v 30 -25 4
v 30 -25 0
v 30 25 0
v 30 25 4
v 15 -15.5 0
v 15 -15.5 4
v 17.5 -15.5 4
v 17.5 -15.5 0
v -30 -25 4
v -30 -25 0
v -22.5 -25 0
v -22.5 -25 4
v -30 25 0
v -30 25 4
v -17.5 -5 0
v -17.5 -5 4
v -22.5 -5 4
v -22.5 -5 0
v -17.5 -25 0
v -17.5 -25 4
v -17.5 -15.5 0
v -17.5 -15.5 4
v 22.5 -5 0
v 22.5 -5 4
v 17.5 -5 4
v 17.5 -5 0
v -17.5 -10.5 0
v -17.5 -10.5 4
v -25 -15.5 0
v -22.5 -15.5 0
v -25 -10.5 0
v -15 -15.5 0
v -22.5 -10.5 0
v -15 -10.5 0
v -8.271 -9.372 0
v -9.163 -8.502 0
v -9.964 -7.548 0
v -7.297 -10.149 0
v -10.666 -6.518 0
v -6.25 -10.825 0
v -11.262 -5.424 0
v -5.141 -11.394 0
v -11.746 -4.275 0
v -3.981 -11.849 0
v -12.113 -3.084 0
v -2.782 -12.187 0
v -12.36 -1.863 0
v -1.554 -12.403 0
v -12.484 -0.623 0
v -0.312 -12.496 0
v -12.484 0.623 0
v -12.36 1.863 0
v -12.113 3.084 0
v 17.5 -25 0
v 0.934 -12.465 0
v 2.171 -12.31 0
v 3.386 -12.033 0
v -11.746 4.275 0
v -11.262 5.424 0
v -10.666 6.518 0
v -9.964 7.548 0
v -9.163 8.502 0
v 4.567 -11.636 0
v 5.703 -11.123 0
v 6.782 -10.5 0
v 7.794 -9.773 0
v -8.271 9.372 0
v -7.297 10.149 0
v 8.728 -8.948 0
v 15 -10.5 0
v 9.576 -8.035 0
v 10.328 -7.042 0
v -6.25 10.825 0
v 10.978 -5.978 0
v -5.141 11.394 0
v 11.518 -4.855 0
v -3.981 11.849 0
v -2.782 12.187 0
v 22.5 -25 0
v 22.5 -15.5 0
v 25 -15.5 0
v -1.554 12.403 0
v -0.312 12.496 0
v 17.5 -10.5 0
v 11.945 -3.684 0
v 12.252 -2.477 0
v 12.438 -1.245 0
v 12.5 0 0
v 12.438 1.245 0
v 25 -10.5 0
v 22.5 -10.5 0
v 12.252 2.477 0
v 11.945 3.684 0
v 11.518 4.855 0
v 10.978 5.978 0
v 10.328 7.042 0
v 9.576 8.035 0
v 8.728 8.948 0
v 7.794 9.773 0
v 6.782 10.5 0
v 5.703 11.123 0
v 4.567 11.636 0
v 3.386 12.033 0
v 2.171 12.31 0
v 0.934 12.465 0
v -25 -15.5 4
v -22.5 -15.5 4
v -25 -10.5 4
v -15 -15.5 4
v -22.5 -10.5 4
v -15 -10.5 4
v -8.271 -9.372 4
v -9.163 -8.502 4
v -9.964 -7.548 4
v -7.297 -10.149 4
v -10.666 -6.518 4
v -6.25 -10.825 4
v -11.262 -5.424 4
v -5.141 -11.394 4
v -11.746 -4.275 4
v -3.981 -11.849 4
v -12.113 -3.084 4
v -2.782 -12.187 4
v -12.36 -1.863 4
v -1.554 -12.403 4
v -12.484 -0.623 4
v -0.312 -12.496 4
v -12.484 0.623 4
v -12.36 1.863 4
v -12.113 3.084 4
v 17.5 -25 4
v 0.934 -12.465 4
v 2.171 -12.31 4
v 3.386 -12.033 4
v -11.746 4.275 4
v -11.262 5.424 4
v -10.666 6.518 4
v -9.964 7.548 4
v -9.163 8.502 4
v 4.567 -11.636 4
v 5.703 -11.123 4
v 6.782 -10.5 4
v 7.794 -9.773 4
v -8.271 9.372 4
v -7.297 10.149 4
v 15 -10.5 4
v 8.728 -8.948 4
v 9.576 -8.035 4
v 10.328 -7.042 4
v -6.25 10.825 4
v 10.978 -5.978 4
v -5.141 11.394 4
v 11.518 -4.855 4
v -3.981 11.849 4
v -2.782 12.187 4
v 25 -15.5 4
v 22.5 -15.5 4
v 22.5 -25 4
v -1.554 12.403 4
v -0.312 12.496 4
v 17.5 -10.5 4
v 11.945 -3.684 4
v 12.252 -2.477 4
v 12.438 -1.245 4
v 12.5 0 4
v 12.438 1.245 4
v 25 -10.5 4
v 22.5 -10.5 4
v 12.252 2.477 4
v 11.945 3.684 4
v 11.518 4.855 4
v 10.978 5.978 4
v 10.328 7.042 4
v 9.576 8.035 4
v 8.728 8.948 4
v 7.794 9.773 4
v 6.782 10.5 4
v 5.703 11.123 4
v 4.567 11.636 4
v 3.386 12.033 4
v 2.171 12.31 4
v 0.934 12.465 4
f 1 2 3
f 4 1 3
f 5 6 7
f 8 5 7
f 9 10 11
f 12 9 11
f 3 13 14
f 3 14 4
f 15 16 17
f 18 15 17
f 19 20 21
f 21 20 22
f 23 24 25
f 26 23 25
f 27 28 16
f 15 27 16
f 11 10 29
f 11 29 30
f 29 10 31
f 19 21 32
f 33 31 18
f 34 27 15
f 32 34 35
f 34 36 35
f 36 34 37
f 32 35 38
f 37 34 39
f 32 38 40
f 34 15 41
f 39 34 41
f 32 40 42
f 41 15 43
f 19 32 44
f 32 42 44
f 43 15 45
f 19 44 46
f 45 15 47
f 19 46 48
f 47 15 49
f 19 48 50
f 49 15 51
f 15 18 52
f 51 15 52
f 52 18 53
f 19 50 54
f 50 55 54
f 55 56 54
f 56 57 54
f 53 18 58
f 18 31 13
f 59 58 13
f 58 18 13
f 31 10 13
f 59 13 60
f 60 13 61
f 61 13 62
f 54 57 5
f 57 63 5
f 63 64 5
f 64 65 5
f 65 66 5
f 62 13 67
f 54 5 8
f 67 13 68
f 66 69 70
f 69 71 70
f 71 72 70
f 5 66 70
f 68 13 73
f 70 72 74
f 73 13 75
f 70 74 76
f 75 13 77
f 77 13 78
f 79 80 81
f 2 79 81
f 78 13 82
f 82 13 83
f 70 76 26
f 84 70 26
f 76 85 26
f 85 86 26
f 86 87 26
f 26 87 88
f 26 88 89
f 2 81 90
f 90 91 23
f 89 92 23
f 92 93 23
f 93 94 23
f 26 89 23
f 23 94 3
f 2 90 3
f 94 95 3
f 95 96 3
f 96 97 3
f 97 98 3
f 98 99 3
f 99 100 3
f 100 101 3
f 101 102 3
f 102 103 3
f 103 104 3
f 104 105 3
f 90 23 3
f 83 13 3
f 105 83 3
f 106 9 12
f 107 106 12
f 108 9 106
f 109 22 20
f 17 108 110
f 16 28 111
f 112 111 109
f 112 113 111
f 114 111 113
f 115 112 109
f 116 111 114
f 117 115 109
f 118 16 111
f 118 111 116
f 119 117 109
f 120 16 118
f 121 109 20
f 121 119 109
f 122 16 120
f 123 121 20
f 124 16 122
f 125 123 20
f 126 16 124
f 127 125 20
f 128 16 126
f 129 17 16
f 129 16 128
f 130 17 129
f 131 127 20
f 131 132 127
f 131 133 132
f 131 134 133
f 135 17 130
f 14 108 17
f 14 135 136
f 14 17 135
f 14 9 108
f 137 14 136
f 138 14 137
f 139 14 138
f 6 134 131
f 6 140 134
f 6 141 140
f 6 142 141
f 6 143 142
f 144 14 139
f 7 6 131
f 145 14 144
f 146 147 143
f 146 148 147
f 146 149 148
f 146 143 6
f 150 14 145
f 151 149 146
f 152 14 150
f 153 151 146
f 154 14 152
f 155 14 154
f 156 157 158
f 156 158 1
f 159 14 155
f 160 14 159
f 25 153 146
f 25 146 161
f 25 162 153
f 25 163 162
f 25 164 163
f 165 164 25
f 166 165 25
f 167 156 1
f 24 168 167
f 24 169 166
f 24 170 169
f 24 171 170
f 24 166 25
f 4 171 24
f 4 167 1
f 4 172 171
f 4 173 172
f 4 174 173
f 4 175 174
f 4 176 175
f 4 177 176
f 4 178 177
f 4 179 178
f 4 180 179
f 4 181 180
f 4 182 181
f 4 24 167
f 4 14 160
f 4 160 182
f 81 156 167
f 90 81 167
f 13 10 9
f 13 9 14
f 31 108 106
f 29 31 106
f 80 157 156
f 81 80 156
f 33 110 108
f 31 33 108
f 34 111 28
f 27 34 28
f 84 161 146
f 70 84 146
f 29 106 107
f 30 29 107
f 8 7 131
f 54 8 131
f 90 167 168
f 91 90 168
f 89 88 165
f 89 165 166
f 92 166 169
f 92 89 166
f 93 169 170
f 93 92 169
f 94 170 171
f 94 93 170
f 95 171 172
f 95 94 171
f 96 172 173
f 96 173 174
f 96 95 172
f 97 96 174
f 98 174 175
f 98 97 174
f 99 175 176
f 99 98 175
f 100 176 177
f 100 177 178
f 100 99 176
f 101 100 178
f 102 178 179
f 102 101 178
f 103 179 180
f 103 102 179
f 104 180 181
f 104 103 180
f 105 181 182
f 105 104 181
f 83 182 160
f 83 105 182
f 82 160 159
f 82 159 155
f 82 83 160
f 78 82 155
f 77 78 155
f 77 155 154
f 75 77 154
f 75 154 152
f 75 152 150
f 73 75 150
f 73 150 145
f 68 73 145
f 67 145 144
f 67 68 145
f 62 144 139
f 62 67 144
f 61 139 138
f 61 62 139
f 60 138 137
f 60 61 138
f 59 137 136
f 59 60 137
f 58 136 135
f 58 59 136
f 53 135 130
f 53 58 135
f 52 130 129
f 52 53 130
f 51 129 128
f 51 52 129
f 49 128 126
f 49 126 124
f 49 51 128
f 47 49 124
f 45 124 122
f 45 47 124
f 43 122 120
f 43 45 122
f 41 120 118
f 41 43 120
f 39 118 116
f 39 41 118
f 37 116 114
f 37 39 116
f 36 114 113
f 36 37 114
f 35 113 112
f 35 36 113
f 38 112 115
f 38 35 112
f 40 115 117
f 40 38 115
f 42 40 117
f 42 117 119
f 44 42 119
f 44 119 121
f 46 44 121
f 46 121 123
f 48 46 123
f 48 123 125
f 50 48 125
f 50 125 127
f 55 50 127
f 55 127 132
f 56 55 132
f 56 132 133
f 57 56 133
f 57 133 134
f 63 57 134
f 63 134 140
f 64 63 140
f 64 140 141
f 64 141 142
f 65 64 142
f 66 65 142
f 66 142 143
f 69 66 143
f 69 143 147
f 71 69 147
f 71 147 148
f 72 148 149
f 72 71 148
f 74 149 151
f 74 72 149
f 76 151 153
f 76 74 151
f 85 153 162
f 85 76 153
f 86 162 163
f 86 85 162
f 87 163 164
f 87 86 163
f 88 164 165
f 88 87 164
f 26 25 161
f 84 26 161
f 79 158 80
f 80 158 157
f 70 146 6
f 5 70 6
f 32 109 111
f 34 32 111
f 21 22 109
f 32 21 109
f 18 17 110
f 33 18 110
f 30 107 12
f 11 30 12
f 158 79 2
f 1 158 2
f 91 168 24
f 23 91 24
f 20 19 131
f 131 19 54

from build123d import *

# Parameters (mm, degrees)
SKETCH1_W           = 60
SKETCH1_H           = 50
SKETCH1_R           = 12.5
BOSS_EXTRUDE1_DEPTH = 4
CUT_EXTRUDE1_DEPTH  = 5


with BuildPart() as part:
    # Sketch1 → Boss-Extrude1 (new body)
    with BuildSketch(Plane.XY):
        Rectangle(SKETCH1_W, SKETCH1_H)
        Circle(SKETCH1_R, mode=Mode.SUBTRACT)
    extrude(amount=BOSS_EXTRUDE1_DEPTH)

    # Sketch2 → Cut-Extrude1 (cut, through all)
    with BuildSketch(Plane.XY.offset(4)):
        Polygon((-17.5, -5), (-22.5, -5), (-22.5, -10.5), (-25, -10.5), (-25, -15.5), (-22.5, -15.5), (-22.5, -25), (-17.5, -25), (-17.5, -15.5), (-15, -15.5), (-15, -10.5), (-17.5, -10.5), align=None)
        Polygon((22.5, -5), (17.5, -5), (17.5, -10.5), (15, -10.5), (15, -15.5), (17.5, -15.5), (17.5, -25), (22.5, -25), (22.5, -15.5), (25, -15.5), (25, -10.5), (22.5, -10.5), align=None)
    extrude(amount=-CUT_EXTRUDE1_DEPTH, mode=Mode.SUBTRACT)


solid = part.part
